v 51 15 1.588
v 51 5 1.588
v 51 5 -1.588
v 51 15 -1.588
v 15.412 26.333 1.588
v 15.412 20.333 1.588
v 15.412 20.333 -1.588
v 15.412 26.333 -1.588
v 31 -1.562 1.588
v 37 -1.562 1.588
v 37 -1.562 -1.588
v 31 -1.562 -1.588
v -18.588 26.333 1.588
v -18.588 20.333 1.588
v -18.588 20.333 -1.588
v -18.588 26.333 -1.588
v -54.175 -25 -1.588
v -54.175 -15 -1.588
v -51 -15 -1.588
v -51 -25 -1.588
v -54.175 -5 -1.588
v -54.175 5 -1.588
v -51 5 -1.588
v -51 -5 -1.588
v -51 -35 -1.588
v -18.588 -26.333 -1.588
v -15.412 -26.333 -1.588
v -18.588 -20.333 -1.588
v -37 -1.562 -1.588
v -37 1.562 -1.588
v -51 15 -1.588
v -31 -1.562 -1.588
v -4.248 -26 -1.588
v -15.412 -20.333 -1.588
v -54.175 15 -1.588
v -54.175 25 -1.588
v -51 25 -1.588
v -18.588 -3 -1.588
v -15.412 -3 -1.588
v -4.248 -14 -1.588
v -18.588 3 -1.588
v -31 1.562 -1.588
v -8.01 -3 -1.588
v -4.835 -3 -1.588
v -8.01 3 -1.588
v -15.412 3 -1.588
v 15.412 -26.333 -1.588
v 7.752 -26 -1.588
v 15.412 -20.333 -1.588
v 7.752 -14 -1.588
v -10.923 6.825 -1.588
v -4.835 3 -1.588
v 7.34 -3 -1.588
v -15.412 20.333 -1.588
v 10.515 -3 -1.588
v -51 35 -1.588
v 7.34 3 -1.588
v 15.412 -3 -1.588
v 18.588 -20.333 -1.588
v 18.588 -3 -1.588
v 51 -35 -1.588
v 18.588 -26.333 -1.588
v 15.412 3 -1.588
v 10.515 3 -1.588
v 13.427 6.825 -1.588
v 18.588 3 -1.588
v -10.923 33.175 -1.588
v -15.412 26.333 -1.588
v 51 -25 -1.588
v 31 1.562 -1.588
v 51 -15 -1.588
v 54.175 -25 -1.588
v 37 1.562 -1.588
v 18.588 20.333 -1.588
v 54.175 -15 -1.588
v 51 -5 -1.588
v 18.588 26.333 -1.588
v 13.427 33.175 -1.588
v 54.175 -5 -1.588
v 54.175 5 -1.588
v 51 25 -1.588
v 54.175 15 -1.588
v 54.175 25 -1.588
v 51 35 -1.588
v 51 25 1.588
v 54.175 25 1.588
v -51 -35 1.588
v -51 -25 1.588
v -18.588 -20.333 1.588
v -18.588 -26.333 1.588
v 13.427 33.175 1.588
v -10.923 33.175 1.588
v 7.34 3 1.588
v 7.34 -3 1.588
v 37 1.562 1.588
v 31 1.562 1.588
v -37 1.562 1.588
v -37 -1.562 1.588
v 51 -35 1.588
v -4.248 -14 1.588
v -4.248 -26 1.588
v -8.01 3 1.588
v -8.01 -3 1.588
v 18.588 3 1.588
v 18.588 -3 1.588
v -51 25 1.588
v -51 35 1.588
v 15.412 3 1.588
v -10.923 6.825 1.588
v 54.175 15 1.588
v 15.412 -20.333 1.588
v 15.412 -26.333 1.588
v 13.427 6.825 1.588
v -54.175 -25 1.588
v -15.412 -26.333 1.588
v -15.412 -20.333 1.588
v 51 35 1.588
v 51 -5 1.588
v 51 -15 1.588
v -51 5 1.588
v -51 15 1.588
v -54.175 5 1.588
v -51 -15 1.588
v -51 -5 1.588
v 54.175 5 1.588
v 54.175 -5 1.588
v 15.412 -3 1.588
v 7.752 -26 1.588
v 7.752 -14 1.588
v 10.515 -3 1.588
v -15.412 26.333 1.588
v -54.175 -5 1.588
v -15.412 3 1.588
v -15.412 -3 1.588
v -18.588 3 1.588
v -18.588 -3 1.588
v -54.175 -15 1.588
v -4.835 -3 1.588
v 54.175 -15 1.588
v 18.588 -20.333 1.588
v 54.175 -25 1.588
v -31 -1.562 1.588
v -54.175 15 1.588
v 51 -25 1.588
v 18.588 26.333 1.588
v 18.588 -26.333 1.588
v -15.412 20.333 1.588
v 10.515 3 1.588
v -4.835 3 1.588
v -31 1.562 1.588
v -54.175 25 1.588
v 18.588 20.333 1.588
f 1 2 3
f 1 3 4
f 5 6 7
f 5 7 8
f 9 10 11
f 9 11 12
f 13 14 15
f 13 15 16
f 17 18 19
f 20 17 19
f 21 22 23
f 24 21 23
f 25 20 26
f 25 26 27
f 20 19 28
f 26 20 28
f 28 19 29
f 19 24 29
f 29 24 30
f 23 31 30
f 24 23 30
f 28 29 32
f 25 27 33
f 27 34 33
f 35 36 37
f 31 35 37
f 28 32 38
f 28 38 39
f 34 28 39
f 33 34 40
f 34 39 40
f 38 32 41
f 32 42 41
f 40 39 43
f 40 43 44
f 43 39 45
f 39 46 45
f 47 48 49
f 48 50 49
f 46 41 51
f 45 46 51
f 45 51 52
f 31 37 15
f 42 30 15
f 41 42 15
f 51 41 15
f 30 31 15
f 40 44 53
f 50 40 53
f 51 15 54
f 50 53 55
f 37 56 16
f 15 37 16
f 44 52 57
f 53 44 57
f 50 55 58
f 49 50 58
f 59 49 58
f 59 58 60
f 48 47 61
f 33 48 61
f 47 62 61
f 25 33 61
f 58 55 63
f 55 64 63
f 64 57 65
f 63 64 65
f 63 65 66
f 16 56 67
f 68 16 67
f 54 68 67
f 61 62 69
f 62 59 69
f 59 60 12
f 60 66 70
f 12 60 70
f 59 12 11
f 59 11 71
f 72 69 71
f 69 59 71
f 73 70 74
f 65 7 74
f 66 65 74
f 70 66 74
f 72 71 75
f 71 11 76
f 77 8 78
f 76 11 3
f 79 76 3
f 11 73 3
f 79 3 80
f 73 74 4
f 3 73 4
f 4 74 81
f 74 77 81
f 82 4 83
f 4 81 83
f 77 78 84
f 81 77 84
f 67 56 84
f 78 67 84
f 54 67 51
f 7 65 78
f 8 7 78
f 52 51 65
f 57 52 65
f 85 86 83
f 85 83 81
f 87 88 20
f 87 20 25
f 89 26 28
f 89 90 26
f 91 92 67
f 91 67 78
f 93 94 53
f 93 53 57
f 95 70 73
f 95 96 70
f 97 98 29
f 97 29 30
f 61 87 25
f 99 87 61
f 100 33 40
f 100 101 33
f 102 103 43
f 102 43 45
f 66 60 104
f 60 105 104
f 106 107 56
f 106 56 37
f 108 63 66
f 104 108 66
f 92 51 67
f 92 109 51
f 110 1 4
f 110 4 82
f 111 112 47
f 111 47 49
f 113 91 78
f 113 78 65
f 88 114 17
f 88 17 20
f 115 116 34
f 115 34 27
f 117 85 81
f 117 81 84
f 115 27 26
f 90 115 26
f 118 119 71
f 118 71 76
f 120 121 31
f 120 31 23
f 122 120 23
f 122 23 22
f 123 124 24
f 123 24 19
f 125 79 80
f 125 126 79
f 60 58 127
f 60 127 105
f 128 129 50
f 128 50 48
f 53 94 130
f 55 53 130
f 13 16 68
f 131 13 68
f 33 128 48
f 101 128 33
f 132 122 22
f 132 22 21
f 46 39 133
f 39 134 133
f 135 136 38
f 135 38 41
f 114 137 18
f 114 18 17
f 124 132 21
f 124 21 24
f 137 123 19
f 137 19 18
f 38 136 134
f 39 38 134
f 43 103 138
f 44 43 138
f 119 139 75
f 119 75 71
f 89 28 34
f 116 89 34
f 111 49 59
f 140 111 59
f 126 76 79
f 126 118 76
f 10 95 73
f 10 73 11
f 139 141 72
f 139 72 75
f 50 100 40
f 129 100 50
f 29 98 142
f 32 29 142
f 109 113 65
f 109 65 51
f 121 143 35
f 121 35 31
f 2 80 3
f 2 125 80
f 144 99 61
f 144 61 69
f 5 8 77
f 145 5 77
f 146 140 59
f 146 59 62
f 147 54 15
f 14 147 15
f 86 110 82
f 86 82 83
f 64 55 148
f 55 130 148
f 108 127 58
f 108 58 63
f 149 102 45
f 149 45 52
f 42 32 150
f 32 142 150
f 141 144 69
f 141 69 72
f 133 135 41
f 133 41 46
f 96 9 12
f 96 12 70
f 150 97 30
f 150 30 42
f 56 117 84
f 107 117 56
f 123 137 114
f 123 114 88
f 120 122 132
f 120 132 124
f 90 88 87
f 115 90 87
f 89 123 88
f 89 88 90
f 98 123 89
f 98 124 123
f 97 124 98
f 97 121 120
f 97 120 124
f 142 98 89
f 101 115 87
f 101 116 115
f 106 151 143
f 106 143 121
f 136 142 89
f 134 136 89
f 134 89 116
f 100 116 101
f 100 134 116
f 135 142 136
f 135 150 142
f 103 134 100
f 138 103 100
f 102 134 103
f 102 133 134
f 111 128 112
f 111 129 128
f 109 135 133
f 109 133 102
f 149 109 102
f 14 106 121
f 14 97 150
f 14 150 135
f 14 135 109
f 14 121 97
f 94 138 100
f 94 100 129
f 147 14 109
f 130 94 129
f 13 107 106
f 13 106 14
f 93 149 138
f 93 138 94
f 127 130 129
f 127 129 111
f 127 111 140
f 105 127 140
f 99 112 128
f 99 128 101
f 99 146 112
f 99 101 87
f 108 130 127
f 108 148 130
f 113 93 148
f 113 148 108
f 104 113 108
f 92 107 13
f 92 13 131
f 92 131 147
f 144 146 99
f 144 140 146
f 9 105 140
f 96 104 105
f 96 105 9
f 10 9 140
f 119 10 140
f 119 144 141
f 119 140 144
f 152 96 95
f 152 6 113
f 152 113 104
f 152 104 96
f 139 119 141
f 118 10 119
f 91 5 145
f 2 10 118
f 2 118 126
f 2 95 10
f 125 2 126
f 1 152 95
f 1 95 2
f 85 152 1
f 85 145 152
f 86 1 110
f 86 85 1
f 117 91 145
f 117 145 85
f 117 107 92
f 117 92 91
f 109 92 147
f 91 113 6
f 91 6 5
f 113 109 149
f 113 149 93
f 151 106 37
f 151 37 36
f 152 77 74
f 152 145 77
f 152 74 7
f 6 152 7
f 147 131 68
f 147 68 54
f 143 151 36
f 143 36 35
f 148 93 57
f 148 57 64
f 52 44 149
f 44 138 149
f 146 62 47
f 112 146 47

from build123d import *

# Parameters (mm, degrees)
SKETCH1_W           = 6
SKETCH1_H           = 3.125
SKETCH1_W_2         = 3.175
SKETCH1_H_2         = 6
BOSS_EXTRUDE1_DEPTH = 1.5875


with BuildPart() as part:
    # Sketch1 → Boss-Extrude1 (new body, symmetric)
    with BuildSketch(Plane.XY):
        Polygon((54.175, 0), (54.175, 5), (51, 5), (51, 15), (54.175, 15), (54.175, 25), (51, 25), (51, 35), (17, 35), (0, 35), (-17, 35), (-51, 35), (-51, 25), (-54.175, 25), (-54.175, 15), (-51, 15), (-51, 5), (-54.175, 5), (-54.175, -5), (-51, -5), (-51, -15), (-54.175, -15), (-54.175, -25), (-51, -25), (-51, -35), (0, -35), (51, -35), (51, -25), (54.175, -25), (54.175, -15), (51, -15), (51, -5), (54.175, -5), align=None)
        Polygon((-18.5875, -23.333333333), (-18.5875, -20.333333333), (-15.4125, -20.333333333), (-15.4125, -26.333333333), (-18.5875, -26.333333333), align=None, mode=Mode.SUBTRACT)
        Polygon((-4.247592219, -14), (3.252407781, -14), (7.752407781, -14), (7.752407781, -26), (3.252407781, -26), (-4.247592219, -26), align=None, mode=Mode.SUBTRACT)
        Polygon((18.5875, -20.333333333), (18.5875, -23.333333333), (18.5875, -26.333333333), (15.4125, -26.333333333), (15.4125, -20.333333333), align=None, mode=Mode.SUBTRACT)
        with Locations((-34, 0)):
            Rectangle(SKETCH1_W, SKETCH1_H, mode=Mode.SUBTRACT)
        with Locations((-17, 0)):
            Rectangle(SKETCH1_W_2, SKETCH1_H_2, mode=Mode.SUBTRACT)
        with Locations((-6.422592219, 0)):
            Rectangle(SKETCH1_W_2, SKETCH1_H_2, mode=Mode.SUBTRACT)
        Polygon((-18.5875, 20.333333333), (-18.5875, 23.333333333), (-18.5875, 26.333333333), (-15.4125, 26.333333333), (-15.4125, 20.333333333), align=None, mode=Mode.SUBTRACT)
        with Locations((8.927407781, 0)):
            Rectangle(SKETCH1_W_2, SKETCH1_H_2, mode=Mode.SUBTRACT)
        with Locations((17, 0)):
            Rectangle(SKETCH1_W_2, SKETCH1_H_2, mode=Mode.SUBTRACT)
        Polygon((37, 1.5625), (37, 0), (37, -1.5625), (31, -1.5625), (31, 1.5625), align=None, mode=Mode.SUBTRACT)
        Polygon((-10.922592219, 33.175), (3.252407781, 33.175), (13.427407781, 33.175), (13.427407781, 6.825), (1.252407781, 6.825), (-10.922592219, 6.825), align=None, mode=Mode.SUBTRACT)
        Polygon((18.5875, 23.333333333), (18.5875, 20.333333333), (15.4125, 20.333333333), (15.4125, 26.333333333), (18.5875, 26.333333333), align=None, mode=Mode.SUBTRACT)
    extrude(amount=BOSS_EXTRUDE1_DEPTH, both=True)


solid = part.part
